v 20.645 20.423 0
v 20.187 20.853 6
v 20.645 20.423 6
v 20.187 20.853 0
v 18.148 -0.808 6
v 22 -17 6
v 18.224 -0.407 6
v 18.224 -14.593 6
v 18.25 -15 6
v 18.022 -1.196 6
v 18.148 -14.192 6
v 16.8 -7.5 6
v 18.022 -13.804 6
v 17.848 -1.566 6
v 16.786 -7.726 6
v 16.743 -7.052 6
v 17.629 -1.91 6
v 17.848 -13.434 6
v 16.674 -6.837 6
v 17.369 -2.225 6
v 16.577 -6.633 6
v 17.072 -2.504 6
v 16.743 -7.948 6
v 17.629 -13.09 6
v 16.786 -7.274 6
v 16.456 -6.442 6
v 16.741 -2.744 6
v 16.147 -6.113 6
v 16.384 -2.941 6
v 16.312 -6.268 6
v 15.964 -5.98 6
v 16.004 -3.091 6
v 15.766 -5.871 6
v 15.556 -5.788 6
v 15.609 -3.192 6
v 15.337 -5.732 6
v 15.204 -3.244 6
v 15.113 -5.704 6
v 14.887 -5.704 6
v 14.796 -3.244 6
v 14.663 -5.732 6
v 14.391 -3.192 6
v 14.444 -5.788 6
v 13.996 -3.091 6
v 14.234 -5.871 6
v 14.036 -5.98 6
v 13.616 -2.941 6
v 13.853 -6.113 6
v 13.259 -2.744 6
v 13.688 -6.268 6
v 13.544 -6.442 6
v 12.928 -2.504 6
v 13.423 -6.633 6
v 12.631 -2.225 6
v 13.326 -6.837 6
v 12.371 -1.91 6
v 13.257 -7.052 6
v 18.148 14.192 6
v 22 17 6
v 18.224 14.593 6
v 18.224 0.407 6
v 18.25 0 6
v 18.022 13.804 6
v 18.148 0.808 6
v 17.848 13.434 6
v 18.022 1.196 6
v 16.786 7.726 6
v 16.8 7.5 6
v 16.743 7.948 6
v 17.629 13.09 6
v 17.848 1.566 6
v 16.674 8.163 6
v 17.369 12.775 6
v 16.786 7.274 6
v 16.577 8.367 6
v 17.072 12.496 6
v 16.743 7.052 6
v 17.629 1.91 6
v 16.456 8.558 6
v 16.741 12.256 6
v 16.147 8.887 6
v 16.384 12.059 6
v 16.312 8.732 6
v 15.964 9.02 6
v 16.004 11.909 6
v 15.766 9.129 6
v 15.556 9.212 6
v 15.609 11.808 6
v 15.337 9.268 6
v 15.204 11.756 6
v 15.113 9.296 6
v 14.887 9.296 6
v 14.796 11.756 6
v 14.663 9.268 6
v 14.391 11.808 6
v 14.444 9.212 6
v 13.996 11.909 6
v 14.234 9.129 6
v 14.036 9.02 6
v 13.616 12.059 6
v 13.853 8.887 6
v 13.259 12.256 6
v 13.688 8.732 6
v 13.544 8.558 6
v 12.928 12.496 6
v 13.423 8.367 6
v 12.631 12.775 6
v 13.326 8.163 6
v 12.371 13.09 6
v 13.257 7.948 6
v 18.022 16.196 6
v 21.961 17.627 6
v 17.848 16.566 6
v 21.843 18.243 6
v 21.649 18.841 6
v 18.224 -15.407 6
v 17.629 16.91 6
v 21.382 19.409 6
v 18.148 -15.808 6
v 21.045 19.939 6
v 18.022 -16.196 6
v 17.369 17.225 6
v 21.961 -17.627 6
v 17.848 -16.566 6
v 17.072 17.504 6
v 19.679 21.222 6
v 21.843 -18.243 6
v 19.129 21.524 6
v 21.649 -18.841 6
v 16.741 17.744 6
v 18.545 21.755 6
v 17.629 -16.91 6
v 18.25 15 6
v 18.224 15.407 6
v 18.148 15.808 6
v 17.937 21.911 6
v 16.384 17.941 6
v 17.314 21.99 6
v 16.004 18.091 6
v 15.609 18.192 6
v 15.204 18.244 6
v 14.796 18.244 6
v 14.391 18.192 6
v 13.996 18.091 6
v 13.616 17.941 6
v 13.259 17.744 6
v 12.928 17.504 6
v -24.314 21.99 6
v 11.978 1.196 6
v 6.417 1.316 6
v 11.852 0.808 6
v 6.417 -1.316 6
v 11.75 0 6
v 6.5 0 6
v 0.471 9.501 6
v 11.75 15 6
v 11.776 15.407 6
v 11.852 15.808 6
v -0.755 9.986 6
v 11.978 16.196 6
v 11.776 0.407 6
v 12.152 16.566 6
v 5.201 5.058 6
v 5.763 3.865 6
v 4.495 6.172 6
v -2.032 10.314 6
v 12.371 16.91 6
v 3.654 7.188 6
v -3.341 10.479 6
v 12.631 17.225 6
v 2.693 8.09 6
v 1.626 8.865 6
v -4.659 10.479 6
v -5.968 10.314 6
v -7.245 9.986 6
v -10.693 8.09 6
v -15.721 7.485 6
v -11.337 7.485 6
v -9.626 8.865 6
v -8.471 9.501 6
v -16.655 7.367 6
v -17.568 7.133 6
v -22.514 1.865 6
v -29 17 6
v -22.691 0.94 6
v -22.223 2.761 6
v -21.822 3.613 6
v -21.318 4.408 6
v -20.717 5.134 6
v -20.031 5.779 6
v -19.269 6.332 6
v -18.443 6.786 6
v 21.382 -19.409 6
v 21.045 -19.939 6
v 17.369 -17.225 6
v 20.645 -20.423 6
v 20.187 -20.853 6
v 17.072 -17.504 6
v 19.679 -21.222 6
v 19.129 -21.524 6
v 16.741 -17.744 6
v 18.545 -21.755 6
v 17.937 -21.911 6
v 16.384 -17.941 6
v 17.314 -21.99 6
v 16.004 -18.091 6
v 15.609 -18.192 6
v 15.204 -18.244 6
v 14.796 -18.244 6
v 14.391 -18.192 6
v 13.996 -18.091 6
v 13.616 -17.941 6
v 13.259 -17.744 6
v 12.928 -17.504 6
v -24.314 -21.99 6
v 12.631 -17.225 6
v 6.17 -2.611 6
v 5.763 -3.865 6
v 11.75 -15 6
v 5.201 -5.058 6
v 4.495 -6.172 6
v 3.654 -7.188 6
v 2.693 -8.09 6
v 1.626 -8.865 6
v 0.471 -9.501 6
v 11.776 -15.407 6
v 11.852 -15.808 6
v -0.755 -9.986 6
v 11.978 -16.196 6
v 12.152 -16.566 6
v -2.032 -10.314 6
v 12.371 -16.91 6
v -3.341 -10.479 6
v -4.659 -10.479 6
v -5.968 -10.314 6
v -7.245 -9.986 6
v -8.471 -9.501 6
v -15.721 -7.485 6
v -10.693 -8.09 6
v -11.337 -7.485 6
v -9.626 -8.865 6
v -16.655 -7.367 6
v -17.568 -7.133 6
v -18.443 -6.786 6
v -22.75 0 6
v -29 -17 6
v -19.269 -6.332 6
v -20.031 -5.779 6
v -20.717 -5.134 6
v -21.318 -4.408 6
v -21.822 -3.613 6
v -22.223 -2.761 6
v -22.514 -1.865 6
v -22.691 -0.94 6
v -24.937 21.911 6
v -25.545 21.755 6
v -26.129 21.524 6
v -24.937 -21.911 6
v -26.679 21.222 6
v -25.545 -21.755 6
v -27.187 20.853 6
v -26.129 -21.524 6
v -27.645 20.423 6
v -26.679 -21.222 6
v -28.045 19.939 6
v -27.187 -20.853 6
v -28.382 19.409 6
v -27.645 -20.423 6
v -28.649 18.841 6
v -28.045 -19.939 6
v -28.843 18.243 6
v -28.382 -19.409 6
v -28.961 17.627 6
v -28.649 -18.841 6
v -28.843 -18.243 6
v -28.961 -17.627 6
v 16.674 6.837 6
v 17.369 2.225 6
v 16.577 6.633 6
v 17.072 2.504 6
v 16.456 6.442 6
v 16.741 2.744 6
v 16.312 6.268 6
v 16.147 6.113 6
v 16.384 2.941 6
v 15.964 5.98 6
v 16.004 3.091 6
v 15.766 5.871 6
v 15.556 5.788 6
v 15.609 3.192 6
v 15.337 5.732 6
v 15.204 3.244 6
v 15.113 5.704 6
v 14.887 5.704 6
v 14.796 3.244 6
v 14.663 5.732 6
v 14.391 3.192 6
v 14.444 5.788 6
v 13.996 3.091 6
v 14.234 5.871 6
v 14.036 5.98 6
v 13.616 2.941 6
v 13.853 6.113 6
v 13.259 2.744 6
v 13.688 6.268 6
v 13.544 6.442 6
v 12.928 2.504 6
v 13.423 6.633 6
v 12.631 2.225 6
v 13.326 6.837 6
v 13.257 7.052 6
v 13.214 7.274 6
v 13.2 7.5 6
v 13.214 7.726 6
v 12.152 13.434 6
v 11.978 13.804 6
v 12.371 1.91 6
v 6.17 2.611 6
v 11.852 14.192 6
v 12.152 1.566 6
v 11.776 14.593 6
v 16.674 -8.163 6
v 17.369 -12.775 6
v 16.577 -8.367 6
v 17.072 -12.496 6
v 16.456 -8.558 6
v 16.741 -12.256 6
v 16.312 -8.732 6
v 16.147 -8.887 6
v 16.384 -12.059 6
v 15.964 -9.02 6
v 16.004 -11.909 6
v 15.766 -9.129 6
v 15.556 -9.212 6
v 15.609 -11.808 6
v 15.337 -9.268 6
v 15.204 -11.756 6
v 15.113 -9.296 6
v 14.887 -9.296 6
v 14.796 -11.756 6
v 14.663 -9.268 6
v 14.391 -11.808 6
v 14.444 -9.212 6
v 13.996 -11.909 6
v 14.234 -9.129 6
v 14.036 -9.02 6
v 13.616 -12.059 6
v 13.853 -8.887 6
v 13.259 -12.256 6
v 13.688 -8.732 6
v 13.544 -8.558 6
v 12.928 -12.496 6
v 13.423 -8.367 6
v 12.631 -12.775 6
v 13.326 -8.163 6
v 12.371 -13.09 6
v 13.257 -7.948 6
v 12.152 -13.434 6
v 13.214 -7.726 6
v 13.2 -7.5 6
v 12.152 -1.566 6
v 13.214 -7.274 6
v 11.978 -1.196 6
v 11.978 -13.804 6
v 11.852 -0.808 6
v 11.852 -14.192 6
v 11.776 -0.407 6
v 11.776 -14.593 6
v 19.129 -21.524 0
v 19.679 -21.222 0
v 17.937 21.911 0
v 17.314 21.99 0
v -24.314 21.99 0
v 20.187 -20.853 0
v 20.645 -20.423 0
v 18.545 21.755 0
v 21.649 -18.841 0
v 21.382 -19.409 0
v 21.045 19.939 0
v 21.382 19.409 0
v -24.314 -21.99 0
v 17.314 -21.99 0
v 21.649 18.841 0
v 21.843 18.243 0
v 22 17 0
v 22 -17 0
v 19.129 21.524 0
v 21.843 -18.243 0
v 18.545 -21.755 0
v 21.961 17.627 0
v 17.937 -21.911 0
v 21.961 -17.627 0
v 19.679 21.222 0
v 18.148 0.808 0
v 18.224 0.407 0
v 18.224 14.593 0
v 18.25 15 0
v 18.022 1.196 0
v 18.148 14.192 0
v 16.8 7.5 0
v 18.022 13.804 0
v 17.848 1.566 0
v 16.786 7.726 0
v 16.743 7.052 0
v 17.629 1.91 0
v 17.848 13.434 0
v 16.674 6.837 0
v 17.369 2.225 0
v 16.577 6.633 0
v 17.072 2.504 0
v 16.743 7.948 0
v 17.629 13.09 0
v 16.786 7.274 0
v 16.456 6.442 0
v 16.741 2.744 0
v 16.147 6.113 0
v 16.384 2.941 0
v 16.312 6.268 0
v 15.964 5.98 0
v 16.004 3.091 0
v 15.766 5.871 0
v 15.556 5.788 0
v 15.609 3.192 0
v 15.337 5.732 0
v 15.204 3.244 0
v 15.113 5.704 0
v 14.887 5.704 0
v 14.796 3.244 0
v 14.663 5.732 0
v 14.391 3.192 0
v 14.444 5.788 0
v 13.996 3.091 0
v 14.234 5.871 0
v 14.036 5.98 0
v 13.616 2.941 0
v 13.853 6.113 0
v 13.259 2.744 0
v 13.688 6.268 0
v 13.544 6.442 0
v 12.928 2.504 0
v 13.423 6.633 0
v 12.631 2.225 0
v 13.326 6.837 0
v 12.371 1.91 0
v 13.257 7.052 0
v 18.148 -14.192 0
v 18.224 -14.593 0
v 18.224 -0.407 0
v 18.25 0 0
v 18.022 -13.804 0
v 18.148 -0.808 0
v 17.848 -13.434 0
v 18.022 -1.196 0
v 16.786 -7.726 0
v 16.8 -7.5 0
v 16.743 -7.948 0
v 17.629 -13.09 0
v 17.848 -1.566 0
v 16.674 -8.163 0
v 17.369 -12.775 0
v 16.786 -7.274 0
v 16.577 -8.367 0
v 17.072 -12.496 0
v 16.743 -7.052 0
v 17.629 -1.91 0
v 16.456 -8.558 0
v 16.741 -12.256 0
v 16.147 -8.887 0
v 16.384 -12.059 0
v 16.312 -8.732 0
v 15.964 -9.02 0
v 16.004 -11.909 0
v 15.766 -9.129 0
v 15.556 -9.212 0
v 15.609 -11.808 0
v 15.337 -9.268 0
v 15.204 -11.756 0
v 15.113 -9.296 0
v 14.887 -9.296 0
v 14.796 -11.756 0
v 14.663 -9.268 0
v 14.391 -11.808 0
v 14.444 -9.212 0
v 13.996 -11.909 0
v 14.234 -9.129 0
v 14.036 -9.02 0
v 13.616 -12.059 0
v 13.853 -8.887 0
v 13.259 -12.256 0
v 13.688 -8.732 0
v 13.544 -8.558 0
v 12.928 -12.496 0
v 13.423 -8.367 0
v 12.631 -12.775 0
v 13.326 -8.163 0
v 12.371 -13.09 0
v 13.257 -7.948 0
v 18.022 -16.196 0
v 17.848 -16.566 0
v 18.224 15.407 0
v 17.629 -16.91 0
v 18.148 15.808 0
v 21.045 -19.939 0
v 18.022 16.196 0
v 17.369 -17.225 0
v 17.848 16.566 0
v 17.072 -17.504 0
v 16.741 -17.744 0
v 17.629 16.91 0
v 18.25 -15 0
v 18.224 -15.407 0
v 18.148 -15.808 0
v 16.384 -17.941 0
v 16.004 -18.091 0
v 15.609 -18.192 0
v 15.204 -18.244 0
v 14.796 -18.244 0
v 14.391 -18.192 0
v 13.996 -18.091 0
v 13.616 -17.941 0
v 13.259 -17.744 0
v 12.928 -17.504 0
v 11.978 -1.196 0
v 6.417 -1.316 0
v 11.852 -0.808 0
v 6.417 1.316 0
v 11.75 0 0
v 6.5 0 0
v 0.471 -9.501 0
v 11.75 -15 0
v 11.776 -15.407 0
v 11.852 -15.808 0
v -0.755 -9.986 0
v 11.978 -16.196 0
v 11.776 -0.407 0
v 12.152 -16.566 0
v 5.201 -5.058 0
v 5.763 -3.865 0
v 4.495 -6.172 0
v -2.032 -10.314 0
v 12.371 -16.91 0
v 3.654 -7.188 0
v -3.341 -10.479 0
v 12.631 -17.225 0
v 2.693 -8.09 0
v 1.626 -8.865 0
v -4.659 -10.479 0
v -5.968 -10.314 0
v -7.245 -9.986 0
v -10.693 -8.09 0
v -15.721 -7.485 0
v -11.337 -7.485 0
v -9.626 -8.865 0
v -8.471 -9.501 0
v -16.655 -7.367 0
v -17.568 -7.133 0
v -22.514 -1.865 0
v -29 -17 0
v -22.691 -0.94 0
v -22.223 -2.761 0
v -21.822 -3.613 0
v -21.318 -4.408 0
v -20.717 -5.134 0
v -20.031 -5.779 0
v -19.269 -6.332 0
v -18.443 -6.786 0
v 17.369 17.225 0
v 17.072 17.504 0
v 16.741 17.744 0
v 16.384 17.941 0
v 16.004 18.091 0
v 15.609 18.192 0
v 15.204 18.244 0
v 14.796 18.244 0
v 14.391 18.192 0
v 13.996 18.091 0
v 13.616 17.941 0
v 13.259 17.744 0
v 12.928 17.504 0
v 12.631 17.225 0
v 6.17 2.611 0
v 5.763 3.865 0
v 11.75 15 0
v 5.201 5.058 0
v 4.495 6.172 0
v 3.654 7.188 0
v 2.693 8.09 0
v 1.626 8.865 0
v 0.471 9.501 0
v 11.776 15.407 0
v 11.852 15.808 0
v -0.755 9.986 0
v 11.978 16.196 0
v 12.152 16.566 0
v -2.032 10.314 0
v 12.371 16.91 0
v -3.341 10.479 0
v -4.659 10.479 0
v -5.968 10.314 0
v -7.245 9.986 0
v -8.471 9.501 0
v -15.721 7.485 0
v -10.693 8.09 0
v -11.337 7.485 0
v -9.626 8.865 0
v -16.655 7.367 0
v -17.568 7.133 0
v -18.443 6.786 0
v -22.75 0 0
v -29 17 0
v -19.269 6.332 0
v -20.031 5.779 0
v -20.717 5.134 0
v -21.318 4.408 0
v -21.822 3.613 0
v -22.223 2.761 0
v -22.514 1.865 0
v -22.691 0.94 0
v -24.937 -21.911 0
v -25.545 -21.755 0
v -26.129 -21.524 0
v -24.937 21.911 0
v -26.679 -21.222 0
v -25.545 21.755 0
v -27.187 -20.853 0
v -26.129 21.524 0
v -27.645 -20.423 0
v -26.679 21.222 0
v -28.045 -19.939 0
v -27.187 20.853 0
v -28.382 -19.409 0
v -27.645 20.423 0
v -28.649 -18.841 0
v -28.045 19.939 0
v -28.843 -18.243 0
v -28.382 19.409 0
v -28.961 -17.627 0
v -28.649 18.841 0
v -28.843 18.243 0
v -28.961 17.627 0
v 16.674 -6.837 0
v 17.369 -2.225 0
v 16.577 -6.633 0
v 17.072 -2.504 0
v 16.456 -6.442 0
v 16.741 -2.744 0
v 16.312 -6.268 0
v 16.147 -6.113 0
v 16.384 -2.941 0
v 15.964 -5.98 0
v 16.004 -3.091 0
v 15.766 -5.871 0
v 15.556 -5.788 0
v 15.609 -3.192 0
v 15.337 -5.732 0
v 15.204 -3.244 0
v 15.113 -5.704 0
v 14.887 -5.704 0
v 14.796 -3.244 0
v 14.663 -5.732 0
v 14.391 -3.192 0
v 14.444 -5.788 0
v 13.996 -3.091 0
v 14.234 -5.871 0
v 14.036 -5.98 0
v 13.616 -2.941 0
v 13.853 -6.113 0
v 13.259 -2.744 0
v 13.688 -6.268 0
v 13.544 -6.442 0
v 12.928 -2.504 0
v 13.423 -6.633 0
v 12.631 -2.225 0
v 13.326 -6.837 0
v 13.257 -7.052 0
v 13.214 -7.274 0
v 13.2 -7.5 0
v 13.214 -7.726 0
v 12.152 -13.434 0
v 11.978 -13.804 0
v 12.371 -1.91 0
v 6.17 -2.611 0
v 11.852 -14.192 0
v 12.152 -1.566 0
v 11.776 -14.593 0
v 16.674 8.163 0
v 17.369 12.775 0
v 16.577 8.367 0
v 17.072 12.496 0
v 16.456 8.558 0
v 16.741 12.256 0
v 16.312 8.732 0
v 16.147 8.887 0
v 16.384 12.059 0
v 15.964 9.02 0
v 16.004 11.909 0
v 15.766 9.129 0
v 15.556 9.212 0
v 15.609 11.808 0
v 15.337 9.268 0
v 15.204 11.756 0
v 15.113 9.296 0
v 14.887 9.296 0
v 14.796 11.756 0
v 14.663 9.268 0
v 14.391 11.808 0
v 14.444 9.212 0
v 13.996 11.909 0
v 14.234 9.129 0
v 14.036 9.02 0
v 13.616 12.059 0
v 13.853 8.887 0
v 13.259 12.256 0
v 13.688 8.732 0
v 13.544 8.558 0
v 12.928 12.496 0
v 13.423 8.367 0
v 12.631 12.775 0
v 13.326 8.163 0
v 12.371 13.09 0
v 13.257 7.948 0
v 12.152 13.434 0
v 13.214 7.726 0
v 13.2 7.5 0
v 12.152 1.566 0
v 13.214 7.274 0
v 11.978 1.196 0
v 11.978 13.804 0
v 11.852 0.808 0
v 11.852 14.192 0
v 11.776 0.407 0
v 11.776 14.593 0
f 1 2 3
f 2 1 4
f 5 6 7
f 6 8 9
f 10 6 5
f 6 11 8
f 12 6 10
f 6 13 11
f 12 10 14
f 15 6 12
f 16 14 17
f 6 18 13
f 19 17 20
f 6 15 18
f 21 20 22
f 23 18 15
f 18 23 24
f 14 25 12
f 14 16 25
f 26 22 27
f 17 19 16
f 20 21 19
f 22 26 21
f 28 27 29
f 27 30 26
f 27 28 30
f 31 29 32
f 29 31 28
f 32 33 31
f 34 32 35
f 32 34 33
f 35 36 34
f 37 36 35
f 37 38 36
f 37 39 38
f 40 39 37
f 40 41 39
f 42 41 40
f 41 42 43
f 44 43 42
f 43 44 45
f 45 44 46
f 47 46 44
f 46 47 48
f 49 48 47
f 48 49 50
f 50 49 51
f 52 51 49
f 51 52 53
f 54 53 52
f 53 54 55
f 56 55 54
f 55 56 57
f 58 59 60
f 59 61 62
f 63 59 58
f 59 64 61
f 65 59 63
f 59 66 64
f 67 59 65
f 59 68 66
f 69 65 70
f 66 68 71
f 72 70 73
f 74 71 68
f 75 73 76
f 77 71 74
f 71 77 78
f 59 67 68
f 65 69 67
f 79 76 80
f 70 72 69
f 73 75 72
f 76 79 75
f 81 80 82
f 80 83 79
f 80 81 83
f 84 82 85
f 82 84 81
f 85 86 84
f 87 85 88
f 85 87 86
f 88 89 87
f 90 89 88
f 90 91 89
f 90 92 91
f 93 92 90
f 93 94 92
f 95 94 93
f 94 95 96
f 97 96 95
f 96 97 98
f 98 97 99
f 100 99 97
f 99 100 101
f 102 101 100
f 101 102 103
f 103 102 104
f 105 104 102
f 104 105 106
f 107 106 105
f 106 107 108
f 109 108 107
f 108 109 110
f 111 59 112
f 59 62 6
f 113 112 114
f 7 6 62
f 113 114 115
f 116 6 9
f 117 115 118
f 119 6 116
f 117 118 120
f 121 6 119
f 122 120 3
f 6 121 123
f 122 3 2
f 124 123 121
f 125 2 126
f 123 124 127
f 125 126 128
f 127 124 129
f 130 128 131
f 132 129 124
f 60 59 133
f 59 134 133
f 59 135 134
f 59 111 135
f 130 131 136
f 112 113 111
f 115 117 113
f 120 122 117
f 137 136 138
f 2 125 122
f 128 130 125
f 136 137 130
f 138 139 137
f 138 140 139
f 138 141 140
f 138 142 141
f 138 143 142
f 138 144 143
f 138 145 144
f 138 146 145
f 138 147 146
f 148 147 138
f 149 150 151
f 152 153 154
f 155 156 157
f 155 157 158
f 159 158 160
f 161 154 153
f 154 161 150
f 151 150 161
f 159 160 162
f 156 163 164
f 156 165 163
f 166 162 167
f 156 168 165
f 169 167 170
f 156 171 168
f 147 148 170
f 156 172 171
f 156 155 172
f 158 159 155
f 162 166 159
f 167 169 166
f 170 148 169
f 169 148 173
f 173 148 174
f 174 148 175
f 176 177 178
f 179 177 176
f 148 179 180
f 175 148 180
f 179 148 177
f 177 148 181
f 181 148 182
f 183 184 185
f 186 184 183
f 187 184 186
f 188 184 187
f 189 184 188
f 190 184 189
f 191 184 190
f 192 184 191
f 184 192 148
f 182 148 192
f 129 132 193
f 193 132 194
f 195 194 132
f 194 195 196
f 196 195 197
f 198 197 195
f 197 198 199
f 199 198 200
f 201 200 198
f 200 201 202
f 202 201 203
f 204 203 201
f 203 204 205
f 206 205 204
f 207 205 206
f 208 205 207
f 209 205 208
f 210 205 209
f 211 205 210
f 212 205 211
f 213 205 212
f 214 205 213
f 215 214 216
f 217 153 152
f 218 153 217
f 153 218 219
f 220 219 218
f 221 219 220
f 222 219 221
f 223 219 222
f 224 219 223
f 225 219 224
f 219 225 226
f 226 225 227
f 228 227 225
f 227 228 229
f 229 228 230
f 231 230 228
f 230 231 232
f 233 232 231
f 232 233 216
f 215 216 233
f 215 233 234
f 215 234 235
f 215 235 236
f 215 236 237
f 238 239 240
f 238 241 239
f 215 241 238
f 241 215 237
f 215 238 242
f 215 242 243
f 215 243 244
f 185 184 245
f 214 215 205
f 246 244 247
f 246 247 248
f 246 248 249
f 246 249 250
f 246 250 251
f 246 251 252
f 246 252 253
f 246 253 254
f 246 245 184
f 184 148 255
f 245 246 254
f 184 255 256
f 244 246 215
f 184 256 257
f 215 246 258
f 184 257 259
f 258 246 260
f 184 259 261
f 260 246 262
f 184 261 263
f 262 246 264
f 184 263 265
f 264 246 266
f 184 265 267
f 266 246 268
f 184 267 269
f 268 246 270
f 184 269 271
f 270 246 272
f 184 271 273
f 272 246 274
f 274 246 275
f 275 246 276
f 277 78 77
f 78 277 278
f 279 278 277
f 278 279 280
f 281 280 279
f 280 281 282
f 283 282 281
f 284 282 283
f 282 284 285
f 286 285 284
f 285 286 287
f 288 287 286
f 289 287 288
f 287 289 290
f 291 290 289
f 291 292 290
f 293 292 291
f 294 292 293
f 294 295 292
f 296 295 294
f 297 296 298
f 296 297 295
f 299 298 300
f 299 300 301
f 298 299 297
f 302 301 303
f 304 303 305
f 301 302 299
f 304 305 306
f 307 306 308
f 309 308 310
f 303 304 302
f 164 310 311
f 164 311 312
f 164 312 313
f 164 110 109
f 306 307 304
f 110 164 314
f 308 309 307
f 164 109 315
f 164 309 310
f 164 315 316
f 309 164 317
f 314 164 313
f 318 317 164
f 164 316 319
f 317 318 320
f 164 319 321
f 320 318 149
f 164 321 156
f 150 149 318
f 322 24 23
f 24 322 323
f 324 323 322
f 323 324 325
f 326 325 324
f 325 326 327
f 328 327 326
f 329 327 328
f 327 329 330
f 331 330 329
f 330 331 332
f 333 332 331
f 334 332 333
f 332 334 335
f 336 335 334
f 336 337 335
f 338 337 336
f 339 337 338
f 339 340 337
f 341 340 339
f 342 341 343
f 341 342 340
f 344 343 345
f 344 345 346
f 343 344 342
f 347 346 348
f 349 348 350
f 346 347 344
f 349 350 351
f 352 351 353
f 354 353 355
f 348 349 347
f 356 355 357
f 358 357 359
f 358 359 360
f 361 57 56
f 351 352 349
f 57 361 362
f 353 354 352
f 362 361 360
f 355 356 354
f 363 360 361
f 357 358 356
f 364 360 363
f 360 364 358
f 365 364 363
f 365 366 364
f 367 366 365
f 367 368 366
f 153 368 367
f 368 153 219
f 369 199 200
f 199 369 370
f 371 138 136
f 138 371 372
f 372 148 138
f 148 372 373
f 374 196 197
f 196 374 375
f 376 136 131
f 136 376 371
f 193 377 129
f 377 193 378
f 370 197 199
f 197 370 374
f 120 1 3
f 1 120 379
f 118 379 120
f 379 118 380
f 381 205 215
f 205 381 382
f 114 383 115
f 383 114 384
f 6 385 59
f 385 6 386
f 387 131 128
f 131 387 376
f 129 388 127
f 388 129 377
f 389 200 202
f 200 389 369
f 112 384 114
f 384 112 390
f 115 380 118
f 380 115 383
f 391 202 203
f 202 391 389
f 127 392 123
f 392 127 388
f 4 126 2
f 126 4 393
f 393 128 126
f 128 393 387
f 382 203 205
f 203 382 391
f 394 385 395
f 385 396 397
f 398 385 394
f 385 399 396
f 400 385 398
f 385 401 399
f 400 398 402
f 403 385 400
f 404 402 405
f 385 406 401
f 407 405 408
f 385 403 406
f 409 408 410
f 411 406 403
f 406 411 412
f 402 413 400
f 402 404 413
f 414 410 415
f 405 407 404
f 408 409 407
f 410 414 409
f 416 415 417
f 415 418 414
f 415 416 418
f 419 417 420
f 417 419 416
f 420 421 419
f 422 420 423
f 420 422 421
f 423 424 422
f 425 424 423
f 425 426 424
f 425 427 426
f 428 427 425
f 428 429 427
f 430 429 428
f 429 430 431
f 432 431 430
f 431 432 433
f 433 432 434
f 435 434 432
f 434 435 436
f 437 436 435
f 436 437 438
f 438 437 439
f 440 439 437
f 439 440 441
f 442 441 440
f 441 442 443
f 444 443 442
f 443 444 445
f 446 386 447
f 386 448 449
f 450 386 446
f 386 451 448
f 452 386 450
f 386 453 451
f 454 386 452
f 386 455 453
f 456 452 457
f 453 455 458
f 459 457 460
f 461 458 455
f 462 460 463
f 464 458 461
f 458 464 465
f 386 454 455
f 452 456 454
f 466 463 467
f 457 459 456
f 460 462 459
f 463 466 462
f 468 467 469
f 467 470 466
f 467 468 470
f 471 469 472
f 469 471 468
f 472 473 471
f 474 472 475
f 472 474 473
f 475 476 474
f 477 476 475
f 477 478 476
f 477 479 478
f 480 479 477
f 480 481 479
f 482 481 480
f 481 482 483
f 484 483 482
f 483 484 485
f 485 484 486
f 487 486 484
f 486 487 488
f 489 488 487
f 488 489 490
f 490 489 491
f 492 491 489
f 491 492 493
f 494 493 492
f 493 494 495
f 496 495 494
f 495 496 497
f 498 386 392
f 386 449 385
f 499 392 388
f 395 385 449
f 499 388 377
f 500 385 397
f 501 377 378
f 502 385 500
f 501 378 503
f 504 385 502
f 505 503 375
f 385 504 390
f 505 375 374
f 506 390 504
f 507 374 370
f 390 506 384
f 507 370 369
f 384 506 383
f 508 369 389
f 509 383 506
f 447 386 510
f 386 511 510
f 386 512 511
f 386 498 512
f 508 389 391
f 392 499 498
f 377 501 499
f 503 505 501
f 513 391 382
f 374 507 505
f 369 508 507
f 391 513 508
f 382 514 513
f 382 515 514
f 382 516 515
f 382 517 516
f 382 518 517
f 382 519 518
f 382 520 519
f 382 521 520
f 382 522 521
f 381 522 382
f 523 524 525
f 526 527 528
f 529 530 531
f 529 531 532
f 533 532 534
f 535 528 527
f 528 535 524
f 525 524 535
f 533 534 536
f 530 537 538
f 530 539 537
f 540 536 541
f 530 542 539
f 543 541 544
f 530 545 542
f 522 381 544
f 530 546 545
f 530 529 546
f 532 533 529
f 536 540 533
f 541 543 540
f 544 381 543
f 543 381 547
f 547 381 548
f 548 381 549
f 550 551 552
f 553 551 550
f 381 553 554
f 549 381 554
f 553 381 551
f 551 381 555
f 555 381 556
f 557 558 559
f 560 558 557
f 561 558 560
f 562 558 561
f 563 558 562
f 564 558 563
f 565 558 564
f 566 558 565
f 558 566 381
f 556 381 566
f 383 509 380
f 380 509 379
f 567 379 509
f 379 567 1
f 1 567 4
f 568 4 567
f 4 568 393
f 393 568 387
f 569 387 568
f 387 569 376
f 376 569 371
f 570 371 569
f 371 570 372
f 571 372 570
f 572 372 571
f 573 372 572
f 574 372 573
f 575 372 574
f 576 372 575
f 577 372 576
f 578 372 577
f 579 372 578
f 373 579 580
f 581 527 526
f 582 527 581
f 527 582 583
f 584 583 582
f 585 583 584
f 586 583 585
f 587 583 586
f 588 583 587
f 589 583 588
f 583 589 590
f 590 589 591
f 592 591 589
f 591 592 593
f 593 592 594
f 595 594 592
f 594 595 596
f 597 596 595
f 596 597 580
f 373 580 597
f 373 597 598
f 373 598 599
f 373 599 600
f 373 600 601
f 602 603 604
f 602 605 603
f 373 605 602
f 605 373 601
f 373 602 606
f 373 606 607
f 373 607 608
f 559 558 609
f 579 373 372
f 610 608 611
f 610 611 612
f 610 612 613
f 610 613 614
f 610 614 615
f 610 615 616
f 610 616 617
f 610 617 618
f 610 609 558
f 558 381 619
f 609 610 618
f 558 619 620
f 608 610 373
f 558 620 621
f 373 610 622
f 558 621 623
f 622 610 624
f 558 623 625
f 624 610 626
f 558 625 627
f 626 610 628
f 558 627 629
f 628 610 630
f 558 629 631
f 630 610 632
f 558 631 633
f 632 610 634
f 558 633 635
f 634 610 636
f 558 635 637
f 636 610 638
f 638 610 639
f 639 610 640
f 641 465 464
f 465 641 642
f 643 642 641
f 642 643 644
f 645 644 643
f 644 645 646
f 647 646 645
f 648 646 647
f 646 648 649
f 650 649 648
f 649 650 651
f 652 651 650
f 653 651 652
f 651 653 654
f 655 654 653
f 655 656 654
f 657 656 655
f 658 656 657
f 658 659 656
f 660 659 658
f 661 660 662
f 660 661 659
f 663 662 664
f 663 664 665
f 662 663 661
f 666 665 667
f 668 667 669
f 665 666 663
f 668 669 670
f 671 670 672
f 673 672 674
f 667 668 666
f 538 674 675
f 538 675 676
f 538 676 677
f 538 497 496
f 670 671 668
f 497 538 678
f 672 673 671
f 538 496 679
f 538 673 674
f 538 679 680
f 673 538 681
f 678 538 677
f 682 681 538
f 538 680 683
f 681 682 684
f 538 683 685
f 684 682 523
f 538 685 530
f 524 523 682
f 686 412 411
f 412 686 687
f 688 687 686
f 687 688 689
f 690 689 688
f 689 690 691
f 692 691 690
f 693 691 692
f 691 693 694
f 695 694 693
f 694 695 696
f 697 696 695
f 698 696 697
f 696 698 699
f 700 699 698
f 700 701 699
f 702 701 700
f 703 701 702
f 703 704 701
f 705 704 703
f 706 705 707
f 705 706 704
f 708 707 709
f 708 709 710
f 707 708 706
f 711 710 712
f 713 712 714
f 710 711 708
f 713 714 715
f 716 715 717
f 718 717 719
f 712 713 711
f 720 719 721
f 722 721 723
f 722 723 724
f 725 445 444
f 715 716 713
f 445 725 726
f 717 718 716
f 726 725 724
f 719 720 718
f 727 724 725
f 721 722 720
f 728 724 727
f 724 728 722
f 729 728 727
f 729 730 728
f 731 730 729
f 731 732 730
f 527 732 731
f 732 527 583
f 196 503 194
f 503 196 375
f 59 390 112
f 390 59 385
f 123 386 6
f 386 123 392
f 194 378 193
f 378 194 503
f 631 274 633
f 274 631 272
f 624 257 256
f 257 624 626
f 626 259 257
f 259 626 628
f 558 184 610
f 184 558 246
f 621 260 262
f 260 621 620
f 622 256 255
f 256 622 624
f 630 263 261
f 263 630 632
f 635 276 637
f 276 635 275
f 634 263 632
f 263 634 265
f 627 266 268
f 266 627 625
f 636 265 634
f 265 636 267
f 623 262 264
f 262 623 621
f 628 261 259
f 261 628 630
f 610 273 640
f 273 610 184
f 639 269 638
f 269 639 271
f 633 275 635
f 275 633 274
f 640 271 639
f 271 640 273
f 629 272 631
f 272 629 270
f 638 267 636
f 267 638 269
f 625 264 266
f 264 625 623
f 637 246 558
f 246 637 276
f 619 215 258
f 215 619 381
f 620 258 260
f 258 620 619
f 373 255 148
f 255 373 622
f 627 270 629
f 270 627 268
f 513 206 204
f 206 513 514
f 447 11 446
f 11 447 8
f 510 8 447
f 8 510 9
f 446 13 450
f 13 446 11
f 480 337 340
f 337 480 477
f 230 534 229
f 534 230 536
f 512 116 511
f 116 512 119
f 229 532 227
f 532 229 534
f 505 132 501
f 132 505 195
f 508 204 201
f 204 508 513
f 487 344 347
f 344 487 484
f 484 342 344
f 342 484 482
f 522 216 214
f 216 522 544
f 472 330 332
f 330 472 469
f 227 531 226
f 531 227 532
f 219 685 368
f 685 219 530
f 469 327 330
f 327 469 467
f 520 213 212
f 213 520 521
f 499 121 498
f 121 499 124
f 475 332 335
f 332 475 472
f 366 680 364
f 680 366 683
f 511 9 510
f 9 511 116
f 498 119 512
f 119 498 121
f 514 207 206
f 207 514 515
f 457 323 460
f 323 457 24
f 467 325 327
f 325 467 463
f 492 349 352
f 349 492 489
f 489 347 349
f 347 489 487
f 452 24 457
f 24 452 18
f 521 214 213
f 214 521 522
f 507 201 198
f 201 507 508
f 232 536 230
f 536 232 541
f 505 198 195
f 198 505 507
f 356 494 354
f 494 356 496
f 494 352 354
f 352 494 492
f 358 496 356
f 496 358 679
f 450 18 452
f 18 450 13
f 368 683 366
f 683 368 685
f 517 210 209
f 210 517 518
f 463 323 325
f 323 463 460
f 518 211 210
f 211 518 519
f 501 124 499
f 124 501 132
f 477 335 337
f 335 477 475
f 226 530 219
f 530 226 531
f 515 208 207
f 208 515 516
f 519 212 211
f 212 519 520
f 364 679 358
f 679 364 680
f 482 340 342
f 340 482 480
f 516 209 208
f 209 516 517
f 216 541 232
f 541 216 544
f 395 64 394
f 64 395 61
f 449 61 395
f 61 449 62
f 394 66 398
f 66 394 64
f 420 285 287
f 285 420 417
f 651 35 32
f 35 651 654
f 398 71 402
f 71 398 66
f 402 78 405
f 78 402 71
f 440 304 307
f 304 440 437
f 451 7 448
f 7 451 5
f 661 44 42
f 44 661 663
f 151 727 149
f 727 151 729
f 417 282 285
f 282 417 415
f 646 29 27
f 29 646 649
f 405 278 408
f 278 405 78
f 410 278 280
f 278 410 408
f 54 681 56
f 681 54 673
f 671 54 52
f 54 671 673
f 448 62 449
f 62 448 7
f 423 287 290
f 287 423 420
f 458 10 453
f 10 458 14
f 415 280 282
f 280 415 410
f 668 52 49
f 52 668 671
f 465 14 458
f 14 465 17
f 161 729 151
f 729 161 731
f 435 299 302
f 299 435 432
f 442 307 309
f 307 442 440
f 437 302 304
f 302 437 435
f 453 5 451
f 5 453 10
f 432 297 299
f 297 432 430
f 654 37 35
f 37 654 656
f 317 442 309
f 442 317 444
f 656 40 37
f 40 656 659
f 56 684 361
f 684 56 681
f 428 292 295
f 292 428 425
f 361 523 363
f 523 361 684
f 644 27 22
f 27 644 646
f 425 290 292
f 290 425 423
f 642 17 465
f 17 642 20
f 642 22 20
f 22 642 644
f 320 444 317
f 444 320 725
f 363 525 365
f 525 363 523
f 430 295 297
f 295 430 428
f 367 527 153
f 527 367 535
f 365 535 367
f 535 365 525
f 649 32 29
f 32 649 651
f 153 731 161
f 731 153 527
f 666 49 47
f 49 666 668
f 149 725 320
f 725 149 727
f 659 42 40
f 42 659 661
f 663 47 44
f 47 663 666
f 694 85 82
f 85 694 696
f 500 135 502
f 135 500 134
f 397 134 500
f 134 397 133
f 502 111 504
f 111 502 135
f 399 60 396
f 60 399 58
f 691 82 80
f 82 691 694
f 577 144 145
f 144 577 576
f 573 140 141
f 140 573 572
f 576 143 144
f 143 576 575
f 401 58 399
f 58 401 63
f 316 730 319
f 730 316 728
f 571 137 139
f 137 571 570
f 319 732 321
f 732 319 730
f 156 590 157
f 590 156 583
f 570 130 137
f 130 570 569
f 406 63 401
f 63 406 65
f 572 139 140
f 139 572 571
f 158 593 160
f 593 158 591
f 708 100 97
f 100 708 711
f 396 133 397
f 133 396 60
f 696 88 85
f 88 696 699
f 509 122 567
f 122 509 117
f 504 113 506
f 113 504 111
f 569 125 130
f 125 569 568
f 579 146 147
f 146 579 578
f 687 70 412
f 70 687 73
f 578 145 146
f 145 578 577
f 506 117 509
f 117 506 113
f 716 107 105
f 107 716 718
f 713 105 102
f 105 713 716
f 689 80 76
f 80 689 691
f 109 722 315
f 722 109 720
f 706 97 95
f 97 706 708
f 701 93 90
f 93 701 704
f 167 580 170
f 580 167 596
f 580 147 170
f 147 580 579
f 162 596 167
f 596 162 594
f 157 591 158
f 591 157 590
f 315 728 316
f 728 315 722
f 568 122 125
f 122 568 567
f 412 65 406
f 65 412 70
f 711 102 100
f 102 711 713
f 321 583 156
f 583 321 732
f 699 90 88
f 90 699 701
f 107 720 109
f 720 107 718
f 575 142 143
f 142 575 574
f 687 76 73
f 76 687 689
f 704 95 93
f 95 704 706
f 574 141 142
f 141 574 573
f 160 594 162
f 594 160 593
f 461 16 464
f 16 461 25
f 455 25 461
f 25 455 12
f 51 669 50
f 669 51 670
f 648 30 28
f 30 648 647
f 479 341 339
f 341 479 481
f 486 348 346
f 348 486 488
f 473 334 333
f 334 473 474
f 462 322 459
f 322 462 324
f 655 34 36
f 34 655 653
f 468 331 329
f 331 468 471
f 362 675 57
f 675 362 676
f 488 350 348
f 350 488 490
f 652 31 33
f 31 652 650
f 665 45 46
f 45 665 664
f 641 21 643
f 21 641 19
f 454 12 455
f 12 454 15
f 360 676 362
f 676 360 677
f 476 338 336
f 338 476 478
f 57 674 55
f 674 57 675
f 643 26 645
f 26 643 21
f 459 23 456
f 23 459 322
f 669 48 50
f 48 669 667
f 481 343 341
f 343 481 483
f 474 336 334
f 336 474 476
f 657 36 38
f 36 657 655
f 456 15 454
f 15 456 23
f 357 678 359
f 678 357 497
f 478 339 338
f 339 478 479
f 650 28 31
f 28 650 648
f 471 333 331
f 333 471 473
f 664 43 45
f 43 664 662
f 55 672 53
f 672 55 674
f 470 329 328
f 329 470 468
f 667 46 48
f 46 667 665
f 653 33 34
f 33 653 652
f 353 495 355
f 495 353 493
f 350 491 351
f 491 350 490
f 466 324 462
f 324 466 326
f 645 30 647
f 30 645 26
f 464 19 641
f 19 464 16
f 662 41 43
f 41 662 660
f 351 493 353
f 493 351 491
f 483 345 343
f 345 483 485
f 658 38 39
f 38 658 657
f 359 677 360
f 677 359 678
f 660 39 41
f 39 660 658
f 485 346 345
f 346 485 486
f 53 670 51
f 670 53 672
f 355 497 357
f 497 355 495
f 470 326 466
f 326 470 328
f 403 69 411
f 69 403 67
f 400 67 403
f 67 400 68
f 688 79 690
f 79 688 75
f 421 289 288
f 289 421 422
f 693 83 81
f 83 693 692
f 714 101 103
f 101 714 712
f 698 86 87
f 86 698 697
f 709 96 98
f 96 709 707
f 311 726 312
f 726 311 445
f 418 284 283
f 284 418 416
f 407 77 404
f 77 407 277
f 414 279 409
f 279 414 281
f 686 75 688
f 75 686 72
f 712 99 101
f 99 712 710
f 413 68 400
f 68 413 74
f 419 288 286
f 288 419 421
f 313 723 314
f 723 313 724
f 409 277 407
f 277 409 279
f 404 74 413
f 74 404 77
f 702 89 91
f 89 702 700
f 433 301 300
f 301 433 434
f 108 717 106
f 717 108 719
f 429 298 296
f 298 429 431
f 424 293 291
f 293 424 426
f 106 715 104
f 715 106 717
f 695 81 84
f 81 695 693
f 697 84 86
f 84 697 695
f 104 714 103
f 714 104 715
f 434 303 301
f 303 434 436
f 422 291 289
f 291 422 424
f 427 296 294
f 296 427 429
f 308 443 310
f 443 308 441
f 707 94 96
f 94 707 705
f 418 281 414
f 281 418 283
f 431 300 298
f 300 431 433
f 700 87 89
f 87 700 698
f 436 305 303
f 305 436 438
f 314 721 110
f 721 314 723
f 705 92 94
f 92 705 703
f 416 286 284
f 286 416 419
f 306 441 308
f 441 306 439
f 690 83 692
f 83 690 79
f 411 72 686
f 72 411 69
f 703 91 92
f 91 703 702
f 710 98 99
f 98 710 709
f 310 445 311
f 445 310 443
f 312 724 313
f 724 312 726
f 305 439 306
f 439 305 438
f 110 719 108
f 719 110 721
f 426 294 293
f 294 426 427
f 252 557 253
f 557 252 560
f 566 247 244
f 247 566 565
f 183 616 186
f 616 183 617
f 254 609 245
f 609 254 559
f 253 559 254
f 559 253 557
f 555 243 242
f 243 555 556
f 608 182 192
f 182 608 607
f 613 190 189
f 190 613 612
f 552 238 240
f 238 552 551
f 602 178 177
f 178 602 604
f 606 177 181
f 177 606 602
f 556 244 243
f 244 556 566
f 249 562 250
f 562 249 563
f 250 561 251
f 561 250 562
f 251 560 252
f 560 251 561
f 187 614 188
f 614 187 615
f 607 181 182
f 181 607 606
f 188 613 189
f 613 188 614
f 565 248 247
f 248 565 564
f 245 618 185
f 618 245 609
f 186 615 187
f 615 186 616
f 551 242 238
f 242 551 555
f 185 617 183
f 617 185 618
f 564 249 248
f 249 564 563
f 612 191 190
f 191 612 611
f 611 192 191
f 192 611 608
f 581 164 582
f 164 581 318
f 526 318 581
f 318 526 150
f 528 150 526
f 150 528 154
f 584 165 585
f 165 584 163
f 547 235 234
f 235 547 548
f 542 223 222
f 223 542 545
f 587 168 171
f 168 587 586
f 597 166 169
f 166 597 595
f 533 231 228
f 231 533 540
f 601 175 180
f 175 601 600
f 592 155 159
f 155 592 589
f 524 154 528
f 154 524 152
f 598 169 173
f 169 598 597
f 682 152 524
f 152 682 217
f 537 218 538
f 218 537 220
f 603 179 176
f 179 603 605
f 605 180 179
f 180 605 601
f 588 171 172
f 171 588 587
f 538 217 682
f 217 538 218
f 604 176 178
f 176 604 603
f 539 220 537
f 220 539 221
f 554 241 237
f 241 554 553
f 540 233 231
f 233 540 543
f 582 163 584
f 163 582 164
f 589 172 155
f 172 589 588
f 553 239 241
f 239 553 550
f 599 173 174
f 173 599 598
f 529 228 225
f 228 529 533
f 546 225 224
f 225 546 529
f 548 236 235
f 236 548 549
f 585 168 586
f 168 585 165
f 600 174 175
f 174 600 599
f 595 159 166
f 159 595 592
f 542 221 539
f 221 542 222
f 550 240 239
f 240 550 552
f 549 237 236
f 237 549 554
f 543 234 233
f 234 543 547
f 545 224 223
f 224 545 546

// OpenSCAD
$fn = 50;


difference() {
	union() {
		hull() {
			translate(v = [-17.0000000000, 17.0000000000, 0]) {
				cylinder(h = 6, r = 5);
			}
			translate(v = [17.0000000000, 17.0000000000, 0]) {
				cylinder(h = 6, r = 5);
			}
			translate(v = [-17.0000000000, -17.0000000000, 0]) {
				cylinder(h = 6, r = 5);
			}
			translate(v = [17.0000000000, -17.0000000000, 0]) {
				cylinder(h = 6, r = 5);
			}
		}
		translate(v = [-7.0000000000, 0, 0]) {
			hull() {
				translate(v = [-17.0000000000, 17.0000000000, 0]) {
					cylinder(h = 6, r = 5);
				}
				translate(v = [17.0000000000, 17.0000000000, 0]) {
					cylinder(h = 6, r = 5);
				}
				translate(v = [-17.0000000000, -17.0000000000, 0]) {
					cylinder(h = 6, r = 5);
				}
				translate(v = [17.0000000000, -17.0000000000, 0]) {
					cylinder(h = 6, r = 5);
				}
			}
		}
	}
	union() {
		translate(v = [15.0000000000, -15.0000000000, -100.0000000000]) {
			cylinder(h = 200, r = 3.2500000000);
		}
		translate(v = [15.0000000000, 0.0000000000, -100.0000000000]) {
			cylinder(h = 200, r = 3.2500000000);
		}
		translate(v = [15.0000000000, 15.0000000000, -100.0000000000]) {
			cylinder(h = 200, r = 3.2500000000);
		}
		translate(v = [15.0000000000, -15.0000000000, -100.0000000000]) {
			cylinder(h = 200, r = 3.2500000000);
		}
		translate(v = [15.0000000000, 0.0000000000, -100.0000000000]) {
			cylinder(h = 200, r = 3.2500000000);
		}
		translate(v = [15.0000000000, 15.0000000000, -100.0000000000]) {
			cylinder(h = 200, r = 3.2500000000);
		}
		translate(v = [15.0000000000, -15.0000000000, -100.0000000000]) {
			cylinder(h = 200, r = 1.8000000000);
		}
		translate(v = [15.0000000000, -7.5000000000, -100.0000000000]) {
			cylinder(h = 200, r = 1.8000000000);
		}
		translate(v = [15.0000000000, 0.0000000000, -100.0000000000]) {
			cylinder(h = 200, r = 1.8000000000);
		}
		translate(v = [15.0000000000, 7.5000000000, -100.0000000000]) {
			cylinder(h = 200, r = 1.8000000000);
		}
		translate(v = [15.0000000000, 15.0000000000, -100.0000000000]) {
			cylinder(h = 200, r = 1.8000000000);
		}
		translate(v = [15.0000000000, -15.0000000000, -100.0000000000]) {
			cylinder(h = 200, r = 1.8000000000);
		}
		translate(v = [15.0000000000, -7.5000000000, -100.0000000000]) {
			cylinder(h = 200, r = 1.8000000000);
		}
		translate(v = [15.0000000000, 0.0000000000, -100.0000000000]) {
			cylinder(h = 200, r = 1.8000000000);
		}
		translate(v = [15.0000000000, 7.5000000000, -100.0000000000]) {
			cylinder(h = 200, r = 1.8000000000);
		}
		translate(v = [15.0000000000, 15.0000000000, -100.0000000000]) {
			cylinder(h = 200, r = 1.8000000000);
		}
		translate(v = [15.0000000000, -15.0000000000, -100.0000000000]) {
			cylinder(h = 200, r = 1.8000000000);
		}
		translate(v = [15.0000000000, -7.5000000000, -100.0000000000]) {
			cylinder(h = 200, r = 1.8000000000);
		}
		translate(v = [15.0000000000, 0.0000000000, -100.0000000000]) {
			cylinder(h = 200, r = 1.8000000000);
		}
		translate(v = [15.0000000000, 7.5000000000, -100.0000000000]) {
			cylinder(h = 200, r = 1.8000000000);
		}
		translate(v = [15.0000000000, 15.0000000000, -100.0000000000]) {
			cylinder(h = 200, r = 1.8000000000);
		}
		translate(v = [-11.5000000000, 0, 0]) {
			hull() {
				translate(v = [-3.7500000000, 0.0000000000, 0]) {
					cylinder(h = 6, r = 7.5000000000);
				}
				translate(v = [3.7500000000, 0.0000000000, 0]) {
					cylinder(h = 6, r = 7.5000000000);
				}
				translate(v = [-3.7500000000, -0.0000000000, 0]) {
					cylinder(h = 6, r = 7.5000000000);
				}
				translate(v = [3.7500000000, -0.0000000000, 0]) {
					cylinder(h = 6, r = 7.5000000000);
				}
			}
		}
		translate(v = [-4.0000000000, 0, 0.0000000000]) {
			cylinder(h = 6, r = 10.5000000000);
		}
	}
}
